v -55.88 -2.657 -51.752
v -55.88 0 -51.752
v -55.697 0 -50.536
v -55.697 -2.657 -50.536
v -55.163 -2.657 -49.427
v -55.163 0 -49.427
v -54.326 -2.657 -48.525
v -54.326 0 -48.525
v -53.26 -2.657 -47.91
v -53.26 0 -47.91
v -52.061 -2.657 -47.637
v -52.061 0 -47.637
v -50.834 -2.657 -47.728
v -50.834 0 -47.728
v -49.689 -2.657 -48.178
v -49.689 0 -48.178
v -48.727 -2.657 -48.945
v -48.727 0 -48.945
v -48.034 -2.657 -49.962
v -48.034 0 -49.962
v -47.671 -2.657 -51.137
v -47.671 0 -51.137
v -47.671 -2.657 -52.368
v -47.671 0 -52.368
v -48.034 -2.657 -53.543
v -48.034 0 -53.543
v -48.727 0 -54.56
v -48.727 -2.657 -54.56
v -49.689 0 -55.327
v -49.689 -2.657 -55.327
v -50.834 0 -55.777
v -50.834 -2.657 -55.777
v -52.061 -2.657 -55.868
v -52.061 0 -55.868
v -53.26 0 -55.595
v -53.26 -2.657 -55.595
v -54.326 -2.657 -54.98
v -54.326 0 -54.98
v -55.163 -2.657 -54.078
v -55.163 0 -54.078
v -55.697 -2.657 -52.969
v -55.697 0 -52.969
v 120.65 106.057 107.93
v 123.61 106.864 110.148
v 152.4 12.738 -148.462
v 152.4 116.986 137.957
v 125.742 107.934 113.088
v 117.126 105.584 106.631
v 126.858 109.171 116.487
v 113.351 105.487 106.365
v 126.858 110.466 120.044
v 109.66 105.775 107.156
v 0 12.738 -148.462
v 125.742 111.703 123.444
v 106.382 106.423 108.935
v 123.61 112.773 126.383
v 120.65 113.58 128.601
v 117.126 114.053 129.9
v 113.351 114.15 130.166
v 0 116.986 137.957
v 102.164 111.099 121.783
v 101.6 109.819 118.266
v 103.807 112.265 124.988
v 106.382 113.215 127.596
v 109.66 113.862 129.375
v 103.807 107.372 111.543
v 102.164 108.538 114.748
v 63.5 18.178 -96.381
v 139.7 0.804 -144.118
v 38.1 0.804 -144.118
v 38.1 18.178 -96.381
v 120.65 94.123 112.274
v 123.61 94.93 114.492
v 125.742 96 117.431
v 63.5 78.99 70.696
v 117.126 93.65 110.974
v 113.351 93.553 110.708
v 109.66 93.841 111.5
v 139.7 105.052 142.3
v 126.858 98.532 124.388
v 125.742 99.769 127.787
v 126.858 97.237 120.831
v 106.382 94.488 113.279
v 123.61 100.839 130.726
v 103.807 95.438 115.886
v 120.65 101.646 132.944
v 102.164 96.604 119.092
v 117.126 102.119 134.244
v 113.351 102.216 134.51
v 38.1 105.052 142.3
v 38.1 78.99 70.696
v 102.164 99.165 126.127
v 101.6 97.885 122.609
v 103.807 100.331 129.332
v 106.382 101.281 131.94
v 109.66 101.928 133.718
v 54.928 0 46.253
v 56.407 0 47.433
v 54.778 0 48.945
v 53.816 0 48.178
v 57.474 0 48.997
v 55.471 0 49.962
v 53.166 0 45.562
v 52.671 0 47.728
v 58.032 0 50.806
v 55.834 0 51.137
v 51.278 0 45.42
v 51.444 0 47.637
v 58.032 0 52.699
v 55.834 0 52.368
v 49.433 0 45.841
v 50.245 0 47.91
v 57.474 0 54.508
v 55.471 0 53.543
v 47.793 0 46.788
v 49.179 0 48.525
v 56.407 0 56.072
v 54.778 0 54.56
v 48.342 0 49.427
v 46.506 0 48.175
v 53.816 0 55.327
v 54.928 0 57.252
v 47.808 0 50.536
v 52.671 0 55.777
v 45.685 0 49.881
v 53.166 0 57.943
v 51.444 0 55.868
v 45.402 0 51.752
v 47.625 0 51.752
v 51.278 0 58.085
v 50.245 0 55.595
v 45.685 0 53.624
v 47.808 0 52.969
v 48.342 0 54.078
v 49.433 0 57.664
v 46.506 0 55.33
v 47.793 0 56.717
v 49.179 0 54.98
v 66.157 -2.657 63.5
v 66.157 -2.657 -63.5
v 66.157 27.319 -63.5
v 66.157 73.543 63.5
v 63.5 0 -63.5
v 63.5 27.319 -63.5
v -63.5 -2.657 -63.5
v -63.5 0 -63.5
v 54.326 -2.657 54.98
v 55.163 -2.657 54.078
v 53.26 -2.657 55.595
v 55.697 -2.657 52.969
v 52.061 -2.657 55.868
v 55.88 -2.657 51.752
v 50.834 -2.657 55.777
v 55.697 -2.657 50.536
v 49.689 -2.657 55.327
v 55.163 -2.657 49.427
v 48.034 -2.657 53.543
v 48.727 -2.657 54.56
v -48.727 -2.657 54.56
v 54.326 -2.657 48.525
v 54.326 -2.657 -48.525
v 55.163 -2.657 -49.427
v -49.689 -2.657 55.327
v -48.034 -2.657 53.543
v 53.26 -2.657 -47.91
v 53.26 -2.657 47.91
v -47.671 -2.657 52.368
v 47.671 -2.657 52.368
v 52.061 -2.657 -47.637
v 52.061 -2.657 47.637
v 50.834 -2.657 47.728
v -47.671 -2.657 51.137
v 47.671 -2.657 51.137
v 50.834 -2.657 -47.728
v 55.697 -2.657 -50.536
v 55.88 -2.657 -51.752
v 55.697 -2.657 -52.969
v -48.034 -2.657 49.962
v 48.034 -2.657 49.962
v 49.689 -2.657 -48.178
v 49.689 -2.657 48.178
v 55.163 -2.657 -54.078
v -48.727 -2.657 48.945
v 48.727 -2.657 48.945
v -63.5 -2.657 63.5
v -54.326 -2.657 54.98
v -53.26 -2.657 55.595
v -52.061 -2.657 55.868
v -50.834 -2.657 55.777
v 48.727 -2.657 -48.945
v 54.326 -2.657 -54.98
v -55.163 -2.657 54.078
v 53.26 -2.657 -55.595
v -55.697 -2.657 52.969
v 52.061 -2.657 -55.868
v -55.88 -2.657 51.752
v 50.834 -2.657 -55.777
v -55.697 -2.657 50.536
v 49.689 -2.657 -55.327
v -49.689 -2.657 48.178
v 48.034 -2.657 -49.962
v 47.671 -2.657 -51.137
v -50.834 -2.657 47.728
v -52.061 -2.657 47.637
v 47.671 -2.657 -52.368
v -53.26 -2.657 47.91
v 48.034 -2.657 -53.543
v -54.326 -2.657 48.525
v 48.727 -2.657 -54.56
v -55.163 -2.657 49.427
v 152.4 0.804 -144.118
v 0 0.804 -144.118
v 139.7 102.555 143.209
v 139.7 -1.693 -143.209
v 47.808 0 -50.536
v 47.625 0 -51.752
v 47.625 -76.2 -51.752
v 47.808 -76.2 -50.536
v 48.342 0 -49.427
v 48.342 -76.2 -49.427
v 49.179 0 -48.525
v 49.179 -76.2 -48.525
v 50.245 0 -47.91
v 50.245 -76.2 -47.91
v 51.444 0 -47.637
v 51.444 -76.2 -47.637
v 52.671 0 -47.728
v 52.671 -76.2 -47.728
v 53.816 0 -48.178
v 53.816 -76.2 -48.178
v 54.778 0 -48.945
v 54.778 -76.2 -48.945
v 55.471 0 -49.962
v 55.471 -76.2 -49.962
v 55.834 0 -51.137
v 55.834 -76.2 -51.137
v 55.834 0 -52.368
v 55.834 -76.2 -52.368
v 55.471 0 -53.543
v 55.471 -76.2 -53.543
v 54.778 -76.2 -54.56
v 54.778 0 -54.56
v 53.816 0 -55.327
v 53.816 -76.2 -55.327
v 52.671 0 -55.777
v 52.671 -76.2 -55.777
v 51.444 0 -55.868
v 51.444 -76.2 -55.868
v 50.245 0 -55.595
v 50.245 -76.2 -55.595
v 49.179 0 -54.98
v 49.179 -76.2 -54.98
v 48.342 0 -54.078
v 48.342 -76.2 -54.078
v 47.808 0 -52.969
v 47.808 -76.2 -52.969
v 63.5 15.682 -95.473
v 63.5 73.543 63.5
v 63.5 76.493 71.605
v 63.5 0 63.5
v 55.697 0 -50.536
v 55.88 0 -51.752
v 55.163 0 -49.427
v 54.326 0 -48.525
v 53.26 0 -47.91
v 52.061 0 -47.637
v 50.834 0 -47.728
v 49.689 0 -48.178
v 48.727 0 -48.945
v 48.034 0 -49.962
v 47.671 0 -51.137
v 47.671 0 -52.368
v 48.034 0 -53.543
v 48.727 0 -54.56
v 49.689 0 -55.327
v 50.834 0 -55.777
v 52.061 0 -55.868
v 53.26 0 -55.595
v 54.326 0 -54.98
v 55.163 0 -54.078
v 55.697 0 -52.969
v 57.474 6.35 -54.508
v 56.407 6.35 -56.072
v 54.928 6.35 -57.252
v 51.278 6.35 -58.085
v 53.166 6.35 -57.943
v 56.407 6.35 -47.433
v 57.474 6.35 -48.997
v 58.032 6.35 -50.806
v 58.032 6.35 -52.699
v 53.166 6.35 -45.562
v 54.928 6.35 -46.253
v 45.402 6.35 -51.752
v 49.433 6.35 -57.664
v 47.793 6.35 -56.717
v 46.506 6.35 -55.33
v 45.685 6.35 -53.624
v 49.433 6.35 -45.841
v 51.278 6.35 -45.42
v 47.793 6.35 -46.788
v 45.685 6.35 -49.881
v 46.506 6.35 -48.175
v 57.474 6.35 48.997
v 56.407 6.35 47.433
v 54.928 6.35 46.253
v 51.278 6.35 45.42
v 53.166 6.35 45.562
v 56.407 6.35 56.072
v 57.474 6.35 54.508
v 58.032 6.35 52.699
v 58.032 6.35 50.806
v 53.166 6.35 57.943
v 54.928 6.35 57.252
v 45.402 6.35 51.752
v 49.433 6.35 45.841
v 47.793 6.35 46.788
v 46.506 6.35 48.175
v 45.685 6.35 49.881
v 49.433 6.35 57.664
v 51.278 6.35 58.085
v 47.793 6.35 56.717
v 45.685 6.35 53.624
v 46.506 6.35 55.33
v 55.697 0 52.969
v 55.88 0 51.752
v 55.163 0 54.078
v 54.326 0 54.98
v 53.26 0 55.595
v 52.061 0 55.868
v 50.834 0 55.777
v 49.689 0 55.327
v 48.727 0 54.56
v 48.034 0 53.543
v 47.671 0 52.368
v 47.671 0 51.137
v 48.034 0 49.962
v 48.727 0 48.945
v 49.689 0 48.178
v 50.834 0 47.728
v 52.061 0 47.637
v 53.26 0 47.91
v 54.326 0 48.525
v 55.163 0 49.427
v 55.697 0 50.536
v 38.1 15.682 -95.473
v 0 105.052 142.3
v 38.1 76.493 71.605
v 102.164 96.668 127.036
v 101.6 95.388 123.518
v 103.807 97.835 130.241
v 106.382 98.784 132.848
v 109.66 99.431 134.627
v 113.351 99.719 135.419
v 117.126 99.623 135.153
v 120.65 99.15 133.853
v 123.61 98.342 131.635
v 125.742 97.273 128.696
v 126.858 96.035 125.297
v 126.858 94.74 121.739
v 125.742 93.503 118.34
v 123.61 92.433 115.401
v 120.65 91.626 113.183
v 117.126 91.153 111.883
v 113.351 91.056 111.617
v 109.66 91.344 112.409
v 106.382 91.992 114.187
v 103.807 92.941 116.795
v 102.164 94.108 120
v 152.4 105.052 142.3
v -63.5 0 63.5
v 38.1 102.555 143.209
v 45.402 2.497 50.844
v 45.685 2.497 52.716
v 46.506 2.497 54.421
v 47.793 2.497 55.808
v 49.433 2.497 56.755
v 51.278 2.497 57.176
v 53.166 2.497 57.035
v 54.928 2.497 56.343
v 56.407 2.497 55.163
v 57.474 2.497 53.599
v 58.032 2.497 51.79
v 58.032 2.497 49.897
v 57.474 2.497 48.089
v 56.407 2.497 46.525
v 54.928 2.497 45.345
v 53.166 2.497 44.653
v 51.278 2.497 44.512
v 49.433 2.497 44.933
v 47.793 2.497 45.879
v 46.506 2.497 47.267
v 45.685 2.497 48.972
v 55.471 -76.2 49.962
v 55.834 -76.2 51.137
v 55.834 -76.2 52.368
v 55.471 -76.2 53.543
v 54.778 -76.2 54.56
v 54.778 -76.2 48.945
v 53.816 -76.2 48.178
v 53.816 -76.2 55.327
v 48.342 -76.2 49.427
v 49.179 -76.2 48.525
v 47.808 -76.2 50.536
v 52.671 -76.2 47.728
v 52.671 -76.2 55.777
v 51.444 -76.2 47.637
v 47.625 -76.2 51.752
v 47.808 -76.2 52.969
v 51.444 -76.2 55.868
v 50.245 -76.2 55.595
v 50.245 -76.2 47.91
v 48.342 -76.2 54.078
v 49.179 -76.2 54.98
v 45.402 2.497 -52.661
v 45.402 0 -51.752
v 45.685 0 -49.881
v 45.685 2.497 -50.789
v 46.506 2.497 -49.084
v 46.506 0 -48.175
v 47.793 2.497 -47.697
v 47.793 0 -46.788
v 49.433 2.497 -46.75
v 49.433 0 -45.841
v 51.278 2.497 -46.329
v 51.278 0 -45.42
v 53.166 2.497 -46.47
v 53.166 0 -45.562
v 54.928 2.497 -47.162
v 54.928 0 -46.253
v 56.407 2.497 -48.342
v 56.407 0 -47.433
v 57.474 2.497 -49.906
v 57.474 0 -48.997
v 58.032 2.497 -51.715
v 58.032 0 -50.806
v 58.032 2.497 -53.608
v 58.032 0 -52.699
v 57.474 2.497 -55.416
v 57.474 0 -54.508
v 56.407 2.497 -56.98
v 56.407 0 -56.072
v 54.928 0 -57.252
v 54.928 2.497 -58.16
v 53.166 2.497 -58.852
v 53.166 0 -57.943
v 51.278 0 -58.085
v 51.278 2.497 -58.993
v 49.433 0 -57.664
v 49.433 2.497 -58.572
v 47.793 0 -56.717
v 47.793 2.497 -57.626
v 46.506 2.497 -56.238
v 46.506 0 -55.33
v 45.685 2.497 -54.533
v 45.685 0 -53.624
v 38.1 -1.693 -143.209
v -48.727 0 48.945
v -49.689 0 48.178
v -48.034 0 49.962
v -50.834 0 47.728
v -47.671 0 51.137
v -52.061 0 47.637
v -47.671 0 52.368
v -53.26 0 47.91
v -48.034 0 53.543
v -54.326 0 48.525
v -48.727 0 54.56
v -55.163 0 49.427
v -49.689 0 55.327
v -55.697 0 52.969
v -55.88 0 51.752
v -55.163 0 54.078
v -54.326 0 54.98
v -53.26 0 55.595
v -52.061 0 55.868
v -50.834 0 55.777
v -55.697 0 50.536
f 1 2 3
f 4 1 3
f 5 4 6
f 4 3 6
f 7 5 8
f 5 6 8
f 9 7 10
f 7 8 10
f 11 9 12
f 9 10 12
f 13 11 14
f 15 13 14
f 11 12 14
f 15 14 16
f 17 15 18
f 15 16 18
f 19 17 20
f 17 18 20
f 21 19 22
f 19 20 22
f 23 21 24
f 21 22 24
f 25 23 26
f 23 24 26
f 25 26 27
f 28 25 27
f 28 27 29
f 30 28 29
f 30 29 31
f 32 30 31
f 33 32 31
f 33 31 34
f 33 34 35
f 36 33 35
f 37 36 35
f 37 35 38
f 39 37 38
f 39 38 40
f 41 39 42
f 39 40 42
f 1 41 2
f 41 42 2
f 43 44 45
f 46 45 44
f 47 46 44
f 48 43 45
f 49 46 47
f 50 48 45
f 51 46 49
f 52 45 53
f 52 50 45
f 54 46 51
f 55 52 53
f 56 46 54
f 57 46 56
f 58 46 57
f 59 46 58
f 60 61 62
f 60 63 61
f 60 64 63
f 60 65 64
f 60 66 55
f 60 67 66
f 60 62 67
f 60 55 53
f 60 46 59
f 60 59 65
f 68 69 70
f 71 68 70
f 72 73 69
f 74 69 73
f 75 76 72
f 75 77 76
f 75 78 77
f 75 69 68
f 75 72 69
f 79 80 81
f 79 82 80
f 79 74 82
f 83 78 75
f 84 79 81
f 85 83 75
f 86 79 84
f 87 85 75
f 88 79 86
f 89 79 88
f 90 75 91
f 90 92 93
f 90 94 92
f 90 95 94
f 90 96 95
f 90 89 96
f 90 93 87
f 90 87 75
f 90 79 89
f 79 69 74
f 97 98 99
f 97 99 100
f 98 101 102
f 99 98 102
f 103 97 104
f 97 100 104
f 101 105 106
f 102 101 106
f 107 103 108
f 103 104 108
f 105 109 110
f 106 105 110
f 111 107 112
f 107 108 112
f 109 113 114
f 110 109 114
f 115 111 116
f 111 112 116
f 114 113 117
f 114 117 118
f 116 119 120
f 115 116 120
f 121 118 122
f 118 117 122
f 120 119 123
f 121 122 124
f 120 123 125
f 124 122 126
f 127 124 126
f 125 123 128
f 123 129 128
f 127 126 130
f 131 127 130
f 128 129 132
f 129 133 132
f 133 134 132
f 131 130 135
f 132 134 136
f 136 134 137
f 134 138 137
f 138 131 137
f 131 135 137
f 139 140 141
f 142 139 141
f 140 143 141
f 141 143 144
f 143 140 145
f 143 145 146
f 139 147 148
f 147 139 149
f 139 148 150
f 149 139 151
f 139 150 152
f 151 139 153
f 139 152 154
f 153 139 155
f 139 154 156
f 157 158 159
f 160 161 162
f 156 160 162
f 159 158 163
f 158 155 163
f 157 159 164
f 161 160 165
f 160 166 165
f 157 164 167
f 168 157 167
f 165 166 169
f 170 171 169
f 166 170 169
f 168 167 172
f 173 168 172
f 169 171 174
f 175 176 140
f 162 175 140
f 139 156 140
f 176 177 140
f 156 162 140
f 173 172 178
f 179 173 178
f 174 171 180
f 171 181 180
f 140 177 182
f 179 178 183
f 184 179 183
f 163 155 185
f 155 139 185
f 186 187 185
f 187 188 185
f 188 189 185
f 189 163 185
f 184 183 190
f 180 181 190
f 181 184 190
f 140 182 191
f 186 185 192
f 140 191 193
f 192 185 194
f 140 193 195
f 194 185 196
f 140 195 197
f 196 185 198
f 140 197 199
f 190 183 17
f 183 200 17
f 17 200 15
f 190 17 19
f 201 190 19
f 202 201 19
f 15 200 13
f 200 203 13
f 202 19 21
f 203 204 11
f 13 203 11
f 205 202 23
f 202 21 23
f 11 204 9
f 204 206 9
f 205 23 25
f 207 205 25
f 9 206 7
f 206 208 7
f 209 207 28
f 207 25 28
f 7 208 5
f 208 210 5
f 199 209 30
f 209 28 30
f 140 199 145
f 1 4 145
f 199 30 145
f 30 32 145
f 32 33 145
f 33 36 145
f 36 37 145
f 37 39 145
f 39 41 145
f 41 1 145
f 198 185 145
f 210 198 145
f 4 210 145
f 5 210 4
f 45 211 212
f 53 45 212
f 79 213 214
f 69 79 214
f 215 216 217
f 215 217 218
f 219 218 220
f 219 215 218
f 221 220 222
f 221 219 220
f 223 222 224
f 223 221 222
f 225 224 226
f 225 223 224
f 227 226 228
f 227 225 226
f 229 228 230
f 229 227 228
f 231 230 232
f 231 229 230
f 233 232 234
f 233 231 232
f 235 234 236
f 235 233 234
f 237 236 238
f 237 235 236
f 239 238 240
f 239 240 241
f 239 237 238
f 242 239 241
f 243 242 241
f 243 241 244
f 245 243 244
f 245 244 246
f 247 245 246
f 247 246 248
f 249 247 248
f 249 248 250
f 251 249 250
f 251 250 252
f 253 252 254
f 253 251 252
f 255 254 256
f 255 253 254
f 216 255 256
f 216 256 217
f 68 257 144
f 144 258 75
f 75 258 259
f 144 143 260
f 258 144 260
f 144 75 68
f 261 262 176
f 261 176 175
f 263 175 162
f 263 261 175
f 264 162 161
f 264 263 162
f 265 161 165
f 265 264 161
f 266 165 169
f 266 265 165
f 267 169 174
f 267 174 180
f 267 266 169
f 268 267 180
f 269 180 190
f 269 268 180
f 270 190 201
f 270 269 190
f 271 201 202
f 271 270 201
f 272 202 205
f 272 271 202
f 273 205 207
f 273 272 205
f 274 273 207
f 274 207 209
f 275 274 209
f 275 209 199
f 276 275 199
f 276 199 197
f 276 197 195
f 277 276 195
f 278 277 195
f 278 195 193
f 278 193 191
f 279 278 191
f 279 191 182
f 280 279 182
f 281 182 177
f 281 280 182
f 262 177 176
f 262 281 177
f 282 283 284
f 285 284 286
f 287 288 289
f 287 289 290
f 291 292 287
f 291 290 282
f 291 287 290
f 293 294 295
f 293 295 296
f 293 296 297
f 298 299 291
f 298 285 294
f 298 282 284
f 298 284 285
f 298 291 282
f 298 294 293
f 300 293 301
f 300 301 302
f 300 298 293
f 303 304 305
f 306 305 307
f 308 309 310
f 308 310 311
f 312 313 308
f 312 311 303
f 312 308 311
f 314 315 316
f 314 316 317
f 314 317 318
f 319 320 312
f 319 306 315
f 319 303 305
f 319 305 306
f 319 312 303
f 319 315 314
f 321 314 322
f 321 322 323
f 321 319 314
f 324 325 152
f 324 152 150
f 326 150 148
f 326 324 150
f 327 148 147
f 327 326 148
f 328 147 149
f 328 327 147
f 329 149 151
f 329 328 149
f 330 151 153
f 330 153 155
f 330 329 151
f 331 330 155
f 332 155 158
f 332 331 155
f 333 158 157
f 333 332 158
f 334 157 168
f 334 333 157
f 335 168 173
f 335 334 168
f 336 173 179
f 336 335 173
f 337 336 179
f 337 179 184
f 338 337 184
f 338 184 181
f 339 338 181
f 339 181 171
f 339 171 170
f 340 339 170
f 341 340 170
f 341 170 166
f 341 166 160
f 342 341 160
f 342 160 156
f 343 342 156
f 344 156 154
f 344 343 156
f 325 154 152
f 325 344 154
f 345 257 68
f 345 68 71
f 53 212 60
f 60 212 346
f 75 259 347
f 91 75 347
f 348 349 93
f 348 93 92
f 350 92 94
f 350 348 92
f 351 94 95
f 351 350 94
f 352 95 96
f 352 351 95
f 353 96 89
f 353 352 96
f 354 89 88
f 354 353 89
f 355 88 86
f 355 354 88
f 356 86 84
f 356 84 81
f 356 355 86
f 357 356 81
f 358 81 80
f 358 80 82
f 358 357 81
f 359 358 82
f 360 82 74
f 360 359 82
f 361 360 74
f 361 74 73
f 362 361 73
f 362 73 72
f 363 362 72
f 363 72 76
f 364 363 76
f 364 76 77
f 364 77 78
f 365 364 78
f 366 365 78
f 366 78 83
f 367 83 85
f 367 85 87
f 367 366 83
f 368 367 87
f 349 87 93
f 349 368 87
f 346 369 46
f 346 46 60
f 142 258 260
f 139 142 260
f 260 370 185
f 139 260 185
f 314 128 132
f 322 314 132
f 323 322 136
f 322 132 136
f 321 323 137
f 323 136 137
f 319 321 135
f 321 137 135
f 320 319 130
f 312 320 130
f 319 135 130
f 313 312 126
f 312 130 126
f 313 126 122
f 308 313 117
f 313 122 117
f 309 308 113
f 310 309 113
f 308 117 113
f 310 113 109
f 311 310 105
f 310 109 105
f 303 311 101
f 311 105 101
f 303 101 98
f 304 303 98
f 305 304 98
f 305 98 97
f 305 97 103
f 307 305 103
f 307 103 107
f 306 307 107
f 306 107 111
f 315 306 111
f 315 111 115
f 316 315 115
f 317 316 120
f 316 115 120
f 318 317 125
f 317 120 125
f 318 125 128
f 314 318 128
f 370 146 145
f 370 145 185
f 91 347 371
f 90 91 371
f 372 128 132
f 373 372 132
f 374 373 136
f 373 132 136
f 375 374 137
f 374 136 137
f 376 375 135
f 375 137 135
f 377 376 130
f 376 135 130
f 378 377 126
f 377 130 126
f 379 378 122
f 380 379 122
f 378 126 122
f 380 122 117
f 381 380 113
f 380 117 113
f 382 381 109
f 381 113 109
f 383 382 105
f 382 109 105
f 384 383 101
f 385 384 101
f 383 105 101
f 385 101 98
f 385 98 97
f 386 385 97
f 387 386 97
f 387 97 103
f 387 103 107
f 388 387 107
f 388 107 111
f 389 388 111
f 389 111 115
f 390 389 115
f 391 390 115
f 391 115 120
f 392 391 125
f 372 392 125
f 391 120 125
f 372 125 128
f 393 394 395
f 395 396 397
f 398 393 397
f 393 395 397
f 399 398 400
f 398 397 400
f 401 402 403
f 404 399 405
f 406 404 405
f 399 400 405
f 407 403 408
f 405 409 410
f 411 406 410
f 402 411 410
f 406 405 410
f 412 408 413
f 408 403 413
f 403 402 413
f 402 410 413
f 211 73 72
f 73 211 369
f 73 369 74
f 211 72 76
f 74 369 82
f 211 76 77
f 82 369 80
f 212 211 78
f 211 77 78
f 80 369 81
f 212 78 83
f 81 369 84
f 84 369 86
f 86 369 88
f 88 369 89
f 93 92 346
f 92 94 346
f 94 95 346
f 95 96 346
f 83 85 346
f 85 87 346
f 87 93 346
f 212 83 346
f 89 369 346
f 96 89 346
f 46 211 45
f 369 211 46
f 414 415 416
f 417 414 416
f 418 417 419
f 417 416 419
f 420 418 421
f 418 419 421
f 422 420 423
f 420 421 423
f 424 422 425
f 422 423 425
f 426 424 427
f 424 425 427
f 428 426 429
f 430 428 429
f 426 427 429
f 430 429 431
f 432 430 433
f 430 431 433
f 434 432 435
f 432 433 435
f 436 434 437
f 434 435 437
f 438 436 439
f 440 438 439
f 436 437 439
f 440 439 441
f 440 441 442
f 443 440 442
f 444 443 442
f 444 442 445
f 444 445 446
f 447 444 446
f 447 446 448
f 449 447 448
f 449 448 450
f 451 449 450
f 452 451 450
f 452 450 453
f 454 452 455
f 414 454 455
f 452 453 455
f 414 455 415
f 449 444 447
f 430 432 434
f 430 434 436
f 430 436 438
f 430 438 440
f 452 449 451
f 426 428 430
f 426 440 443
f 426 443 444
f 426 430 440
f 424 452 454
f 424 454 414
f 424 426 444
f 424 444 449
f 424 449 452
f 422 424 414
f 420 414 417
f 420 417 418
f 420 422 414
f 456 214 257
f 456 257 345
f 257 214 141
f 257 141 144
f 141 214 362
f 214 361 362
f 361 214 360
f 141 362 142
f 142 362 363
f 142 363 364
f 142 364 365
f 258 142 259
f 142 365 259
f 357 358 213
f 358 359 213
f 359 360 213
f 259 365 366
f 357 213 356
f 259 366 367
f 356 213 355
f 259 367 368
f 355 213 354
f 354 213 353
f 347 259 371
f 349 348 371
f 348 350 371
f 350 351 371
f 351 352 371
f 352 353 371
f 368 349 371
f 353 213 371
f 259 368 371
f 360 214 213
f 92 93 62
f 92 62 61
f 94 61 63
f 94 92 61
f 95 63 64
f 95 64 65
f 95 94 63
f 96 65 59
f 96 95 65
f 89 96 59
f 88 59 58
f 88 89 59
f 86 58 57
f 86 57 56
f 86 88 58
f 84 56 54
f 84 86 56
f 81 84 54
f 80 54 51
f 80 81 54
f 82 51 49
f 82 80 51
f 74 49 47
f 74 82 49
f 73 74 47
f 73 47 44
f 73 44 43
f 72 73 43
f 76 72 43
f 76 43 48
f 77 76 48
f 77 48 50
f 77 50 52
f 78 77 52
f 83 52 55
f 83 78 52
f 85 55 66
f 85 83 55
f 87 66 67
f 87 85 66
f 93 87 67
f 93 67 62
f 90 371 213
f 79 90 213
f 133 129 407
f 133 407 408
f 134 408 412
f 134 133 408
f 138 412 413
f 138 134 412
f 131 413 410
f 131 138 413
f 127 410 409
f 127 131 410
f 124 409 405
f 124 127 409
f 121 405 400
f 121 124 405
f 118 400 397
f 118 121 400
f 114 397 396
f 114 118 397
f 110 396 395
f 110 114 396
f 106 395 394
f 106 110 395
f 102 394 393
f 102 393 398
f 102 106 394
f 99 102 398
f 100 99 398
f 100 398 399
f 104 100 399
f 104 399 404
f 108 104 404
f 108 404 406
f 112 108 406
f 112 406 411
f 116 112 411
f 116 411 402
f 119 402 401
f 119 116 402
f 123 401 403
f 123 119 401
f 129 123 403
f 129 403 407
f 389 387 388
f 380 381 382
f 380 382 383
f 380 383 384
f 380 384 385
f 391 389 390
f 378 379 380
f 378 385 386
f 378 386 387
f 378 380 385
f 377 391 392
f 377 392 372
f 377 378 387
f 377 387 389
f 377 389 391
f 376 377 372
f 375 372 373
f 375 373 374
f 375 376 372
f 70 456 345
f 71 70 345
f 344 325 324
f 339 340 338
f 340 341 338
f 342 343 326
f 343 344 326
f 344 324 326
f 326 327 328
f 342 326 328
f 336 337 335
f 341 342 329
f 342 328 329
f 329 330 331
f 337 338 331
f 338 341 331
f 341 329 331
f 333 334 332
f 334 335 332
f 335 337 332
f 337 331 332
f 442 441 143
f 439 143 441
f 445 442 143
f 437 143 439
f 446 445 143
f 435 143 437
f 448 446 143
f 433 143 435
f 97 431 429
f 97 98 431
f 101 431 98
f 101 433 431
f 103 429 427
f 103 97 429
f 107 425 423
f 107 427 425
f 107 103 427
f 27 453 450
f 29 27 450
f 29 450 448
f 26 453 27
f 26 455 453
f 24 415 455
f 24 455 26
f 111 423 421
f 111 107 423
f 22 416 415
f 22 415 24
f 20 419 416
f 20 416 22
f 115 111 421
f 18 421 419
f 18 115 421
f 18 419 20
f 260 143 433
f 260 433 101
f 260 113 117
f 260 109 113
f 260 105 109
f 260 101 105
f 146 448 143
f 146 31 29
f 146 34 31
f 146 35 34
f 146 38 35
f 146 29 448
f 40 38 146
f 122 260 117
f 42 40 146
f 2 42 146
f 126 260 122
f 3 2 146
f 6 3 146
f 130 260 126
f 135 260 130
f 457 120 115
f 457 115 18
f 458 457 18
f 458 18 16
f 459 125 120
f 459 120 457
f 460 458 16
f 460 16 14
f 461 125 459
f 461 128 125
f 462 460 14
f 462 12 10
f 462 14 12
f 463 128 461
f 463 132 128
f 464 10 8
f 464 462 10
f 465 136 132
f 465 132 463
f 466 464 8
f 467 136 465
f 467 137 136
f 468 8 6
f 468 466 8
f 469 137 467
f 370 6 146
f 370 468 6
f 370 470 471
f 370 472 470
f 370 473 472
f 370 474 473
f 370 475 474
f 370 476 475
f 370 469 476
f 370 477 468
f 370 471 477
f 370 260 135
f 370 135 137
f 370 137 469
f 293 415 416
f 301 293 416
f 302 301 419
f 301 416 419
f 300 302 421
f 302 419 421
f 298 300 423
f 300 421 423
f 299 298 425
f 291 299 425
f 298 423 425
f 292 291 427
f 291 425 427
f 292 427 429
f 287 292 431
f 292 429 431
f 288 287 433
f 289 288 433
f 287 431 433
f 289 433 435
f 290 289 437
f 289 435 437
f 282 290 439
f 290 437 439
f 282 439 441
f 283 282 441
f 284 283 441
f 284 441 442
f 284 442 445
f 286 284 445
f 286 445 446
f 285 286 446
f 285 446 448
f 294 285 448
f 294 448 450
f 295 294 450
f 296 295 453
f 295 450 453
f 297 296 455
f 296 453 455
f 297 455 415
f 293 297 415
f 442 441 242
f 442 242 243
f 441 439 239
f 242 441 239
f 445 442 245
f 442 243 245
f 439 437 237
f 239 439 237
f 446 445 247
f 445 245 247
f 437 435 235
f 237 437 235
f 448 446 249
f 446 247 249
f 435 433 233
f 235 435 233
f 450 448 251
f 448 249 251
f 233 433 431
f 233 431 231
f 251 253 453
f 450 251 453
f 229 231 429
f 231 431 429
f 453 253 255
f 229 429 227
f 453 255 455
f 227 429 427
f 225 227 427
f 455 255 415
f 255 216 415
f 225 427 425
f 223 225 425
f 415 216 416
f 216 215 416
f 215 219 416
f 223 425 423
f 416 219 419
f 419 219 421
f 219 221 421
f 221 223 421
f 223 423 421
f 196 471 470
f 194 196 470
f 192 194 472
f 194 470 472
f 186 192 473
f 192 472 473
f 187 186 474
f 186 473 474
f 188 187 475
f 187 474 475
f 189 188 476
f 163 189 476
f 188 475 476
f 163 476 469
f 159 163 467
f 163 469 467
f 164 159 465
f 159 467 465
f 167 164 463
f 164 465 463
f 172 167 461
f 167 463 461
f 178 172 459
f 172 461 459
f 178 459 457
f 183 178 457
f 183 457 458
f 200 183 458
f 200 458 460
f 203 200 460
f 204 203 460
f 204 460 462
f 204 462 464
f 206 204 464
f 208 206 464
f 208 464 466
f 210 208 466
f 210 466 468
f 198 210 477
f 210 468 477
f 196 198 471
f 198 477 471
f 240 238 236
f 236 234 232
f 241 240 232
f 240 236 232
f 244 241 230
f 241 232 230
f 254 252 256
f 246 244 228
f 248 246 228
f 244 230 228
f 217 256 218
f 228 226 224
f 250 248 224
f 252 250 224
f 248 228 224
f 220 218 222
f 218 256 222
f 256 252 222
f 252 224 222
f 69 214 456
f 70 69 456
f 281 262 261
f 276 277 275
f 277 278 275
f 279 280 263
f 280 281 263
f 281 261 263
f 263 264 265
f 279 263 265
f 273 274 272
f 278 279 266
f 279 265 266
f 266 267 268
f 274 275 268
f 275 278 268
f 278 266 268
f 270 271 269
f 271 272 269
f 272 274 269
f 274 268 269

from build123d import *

# Parameters (mm, degrees)
F0_R      = 4.1275
F1_DEPTH  = 2.65684
F4_DEPTH  = 2.65684
F5_R      = 6.35
F5_R_2    = 4.1275
F6_DEPTH  = 6.35
F7_DEPTH  = 76.2
F8_R      = 12.7
F8_W      = 25.4
F8_H      = 76.2
F8_H_2    = 50.8
F9_DEPTH  = 2.65684
F10_W     = 152.4
F10_H     = 304.8
F10_R     = 12.7
F11_DEPTH = 12.7


with BuildPart() as f1:
    # F0 (on Front) → F1 (new body)
    with BuildSketch(Plane.XZ):
        with BuildLine():
            Line((47.625, -47.625), (46.9269177812, -47.625))
            ThreePointArc((46.9269177812, -47.625), (49.5524939874, -57.7092166749), (58.1025, -51.7525))
            ThreePointArc((58.1025, -51.7525), (54.4088955842, -45.9848260754), (47.625, -46.9269177812))
            Line((47.625, -46.9269177812), (47.625, -47.625))
        make_face()
        with Locations((51.7525, -51.7525)):
            Circle(F0_R, mode=Mode.SUBTRACT)
        with BuildLine():
            Line((46.9269177812, 47.625), (0, 47.625))
            Line((0, 47.625), (0, -47.625))
            Line((0, -47.625), (46.9269177812, -47.625))
            ThreePointArc((46.9269177812, -47.625), (47.2623719395, -47.2623719395), (47.625, -46.9269177812))
            Line((47.625, -46.9269177812), (47.625, 46.9269177812))
            ThreePointArc((47.625, 46.9269177812), (47.2623719395, 47.2623719395), (46.9269177812, 47.625))
        make_face()
        with BuildLine():
            Line((63.5, 63.5), (0, 63.5))
            Line((0, 63.5), (0, 47.625))
            Line((0, 47.625), (46.9269177812, 47.625))
            ThreePointArc((46.9269177812, 47.625), (49.5524939874, 57.7092166749), (58.1025, 51.7525))
            ThreePointArc((58.1025, 51.7525), (54.4088955842, 45.9848260754), (47.625, 46.9269177812))
            Line((47.625, 46.9269177812), (47.625, -46.9269177812))
            ThreePointArc((47.625, -46.9269177812), (54.4088955842, -45.9848260754), (58.1025, -51.7525))
            ThreePointArc((58.1025, -51.7525), (49.5524939874, -57.7092166749), (46.9269177812, -47.625))
            Line((46.9269177812, -47.625), (0, -47.625))
            Line((0, -47.625), (0, -63.5))
            Line((0, -63.5), (63.5, -63.5))
            Line((63.5, -63.5), (63.5, 63.5))
        make_face()
        with BuildLine():
            ThreePointArc((58.1025, 51.7525), (49.5524939874, 57.7092166749), (46.9269177812, 47.625))
            Line((46.9269177812, 47.625), (47.625, 47.625))
            Line((47.625, 47.625), (47.625, 46.9269177812))
            ThreePointArc((47.625, 46.9269177812), (54.4088955842, 45.9848260754), (58.1025, 51.7525))
        make_face()
        with Locations((51.7525, 51.7525)):
            Circle(F0_R, mode=Mode.SUBTRACT)
        with BuildLine():
            Line((47.625, 47.625), (46.9269177812, 47.625))
            ThreePointArc((46.9269177812, 47.625), (47.2623719395, 47.2623719395), (47.625, 46.9269177812))
            Line((47.625, 46.9269177812), (47.625, 47.625))
        make_face()
        with BuildLine():
            ThreePointArc((47.625, -46.9269177812), (47.2623719395, -47.2623719395), (46.9269177812, -47.625))
            Line((46.9269177812, -47.625), (47.625, -47.625))
            Line((47.625, -47.625), (47.625, -46.9269177812))
        make_face()
    extrude(amount=F1_DEPTH)

    # F2: F1 across plane


with BuildPart() as f1_1:
    add(f1.part)
    add(f1.part.mirror(Plane.YZ))

    # F3 (on face) → F4 (join)
    with BuildSketch(Plane.YZ.offset(63.5)):
        Polygon((-2.65684, 63.5), (-2.65684, -63.5), (27.3189402482, -63.5), (73.54316, 63.5), align=None)
    extrude(amount=F4_DEPTH)

    # F8 (on face) + F5 (on face) → F9 (join)
    with BuildSketch(Plane(origin=(0, 44.5317379162, -16.2082270816), x_dir=(-1, 0, 0), z_dir=(0, 0.9396926208, -0.3420201433))):
        Polygon((-63.5, 169.6484349915), (-139.7, 169.6484349915), (-139.7, -135.1515650085), (-63.5, -135.1515650085), (-63.5, -84.3515650085), (-63.5, 93.4484349915), align=None)
        with Locations((-114.3, 148.6934349915)):
            Circle(F8_R, mode=Mode.SUBTRACT)
        with Locations((-50.8, 131.5484349915)):
            Rectangle(F8_W, F8_H)
        with Locations((-50.8, -109.7515650085)):
            Rectangle(F8_W, F8_H_2)
    with BuildSketch(Plane(origin=(0, 0, 0), x_dir=(-1, 0, 0), z_dir=(0, 1, 0))):
        with Locations((-51.7525, 51.7525)):
            Circle(F5_R)
        with Locations((-51.7525, -51.7525)):
            Circle(F5_R)
    extrude(amount=F9_DEPTH, dir=(0, 0.9396926208, -0.3420201433))


with BuildPart() as f6:
    # F5 (on face) → F6 (new body)
    with BuildSketch(Plane(origin=(0, 0, 0), x_dir=(-1, 0, 0), z_dir=(0, 1, 0))):
        with Locations((-51.7525, 51.7525)):
            Circle(F5_R)
        with Locations((-51.7525, 51.7525)):
            Circle(F5_R_2, mode=Mode.SUBTRACT)
        with Locations((-51.7525, 51.7525)):
            Circle(F5_R_2)
    extrude(amount=F6_DEPTH)

    # F5 (on face) → F7, piece 2 (join)
    with BuildSketch(Plane(origin=(0, 0, 0), x_dir=(-1, 0, 0), z_dir=(0, 1, 0))):
        with Locations((-51.7525, 51.7525)):
            Circle(F5_R_2)
    extrude(amount=-F7_DEPTH)


with BuildPart() as f6b:
    # F5 (on face) → F6, piece 2 (new body)
    with BuildSketch(Plane(origin=(0, 0, 0), x_dir=(-1, 0, 0), z_dir=(0, 1, 0))):
        with Locations((-51.7525, -51.7525)):
            Circle(F5_R)
        with Locations((-51.7525, -51.7525)):
            Circle(F5_R_2, mode=Mode.SUBTRACT)
        with Locations((-51.7525, -51.7525)):
            Circle(F5_R_2)
    extrude(amount=F6_DEPTH)

    # F5 (on face) → F7 (join)
    with BuildSketch(Plane(origin=(0, 0, 0), x_dir=(-1, 0, 0), z_dir=(0, 1, 0))):
        with Locations((-51.7525, -51.7525)):
            Circle(F5_R_2)
    extrude(amount=-F7_DEPTH)


with BuildPart() as f11:
    # F10 (on face) → F11 (new body)
    with BuildSketch(Plane(origin=(0, 47.0283508588, -17.1169198792), x_dir=(-1, 0, 0), z_dir=(0, 0.9396926208, -0.3420201433))):
        with Locations((-76.2, 17.2484349915)):
            Rectangle(F10_W, F10_H)
        with Locations((-114.3, 148.6934349915)):
            Circle(F10_R, mode=Mode.SUBTRACT)
    extrude(amount=F11_DEPTH)


solid = Compound([f1_1.part, f6.part, f6b.part, f11.part])
